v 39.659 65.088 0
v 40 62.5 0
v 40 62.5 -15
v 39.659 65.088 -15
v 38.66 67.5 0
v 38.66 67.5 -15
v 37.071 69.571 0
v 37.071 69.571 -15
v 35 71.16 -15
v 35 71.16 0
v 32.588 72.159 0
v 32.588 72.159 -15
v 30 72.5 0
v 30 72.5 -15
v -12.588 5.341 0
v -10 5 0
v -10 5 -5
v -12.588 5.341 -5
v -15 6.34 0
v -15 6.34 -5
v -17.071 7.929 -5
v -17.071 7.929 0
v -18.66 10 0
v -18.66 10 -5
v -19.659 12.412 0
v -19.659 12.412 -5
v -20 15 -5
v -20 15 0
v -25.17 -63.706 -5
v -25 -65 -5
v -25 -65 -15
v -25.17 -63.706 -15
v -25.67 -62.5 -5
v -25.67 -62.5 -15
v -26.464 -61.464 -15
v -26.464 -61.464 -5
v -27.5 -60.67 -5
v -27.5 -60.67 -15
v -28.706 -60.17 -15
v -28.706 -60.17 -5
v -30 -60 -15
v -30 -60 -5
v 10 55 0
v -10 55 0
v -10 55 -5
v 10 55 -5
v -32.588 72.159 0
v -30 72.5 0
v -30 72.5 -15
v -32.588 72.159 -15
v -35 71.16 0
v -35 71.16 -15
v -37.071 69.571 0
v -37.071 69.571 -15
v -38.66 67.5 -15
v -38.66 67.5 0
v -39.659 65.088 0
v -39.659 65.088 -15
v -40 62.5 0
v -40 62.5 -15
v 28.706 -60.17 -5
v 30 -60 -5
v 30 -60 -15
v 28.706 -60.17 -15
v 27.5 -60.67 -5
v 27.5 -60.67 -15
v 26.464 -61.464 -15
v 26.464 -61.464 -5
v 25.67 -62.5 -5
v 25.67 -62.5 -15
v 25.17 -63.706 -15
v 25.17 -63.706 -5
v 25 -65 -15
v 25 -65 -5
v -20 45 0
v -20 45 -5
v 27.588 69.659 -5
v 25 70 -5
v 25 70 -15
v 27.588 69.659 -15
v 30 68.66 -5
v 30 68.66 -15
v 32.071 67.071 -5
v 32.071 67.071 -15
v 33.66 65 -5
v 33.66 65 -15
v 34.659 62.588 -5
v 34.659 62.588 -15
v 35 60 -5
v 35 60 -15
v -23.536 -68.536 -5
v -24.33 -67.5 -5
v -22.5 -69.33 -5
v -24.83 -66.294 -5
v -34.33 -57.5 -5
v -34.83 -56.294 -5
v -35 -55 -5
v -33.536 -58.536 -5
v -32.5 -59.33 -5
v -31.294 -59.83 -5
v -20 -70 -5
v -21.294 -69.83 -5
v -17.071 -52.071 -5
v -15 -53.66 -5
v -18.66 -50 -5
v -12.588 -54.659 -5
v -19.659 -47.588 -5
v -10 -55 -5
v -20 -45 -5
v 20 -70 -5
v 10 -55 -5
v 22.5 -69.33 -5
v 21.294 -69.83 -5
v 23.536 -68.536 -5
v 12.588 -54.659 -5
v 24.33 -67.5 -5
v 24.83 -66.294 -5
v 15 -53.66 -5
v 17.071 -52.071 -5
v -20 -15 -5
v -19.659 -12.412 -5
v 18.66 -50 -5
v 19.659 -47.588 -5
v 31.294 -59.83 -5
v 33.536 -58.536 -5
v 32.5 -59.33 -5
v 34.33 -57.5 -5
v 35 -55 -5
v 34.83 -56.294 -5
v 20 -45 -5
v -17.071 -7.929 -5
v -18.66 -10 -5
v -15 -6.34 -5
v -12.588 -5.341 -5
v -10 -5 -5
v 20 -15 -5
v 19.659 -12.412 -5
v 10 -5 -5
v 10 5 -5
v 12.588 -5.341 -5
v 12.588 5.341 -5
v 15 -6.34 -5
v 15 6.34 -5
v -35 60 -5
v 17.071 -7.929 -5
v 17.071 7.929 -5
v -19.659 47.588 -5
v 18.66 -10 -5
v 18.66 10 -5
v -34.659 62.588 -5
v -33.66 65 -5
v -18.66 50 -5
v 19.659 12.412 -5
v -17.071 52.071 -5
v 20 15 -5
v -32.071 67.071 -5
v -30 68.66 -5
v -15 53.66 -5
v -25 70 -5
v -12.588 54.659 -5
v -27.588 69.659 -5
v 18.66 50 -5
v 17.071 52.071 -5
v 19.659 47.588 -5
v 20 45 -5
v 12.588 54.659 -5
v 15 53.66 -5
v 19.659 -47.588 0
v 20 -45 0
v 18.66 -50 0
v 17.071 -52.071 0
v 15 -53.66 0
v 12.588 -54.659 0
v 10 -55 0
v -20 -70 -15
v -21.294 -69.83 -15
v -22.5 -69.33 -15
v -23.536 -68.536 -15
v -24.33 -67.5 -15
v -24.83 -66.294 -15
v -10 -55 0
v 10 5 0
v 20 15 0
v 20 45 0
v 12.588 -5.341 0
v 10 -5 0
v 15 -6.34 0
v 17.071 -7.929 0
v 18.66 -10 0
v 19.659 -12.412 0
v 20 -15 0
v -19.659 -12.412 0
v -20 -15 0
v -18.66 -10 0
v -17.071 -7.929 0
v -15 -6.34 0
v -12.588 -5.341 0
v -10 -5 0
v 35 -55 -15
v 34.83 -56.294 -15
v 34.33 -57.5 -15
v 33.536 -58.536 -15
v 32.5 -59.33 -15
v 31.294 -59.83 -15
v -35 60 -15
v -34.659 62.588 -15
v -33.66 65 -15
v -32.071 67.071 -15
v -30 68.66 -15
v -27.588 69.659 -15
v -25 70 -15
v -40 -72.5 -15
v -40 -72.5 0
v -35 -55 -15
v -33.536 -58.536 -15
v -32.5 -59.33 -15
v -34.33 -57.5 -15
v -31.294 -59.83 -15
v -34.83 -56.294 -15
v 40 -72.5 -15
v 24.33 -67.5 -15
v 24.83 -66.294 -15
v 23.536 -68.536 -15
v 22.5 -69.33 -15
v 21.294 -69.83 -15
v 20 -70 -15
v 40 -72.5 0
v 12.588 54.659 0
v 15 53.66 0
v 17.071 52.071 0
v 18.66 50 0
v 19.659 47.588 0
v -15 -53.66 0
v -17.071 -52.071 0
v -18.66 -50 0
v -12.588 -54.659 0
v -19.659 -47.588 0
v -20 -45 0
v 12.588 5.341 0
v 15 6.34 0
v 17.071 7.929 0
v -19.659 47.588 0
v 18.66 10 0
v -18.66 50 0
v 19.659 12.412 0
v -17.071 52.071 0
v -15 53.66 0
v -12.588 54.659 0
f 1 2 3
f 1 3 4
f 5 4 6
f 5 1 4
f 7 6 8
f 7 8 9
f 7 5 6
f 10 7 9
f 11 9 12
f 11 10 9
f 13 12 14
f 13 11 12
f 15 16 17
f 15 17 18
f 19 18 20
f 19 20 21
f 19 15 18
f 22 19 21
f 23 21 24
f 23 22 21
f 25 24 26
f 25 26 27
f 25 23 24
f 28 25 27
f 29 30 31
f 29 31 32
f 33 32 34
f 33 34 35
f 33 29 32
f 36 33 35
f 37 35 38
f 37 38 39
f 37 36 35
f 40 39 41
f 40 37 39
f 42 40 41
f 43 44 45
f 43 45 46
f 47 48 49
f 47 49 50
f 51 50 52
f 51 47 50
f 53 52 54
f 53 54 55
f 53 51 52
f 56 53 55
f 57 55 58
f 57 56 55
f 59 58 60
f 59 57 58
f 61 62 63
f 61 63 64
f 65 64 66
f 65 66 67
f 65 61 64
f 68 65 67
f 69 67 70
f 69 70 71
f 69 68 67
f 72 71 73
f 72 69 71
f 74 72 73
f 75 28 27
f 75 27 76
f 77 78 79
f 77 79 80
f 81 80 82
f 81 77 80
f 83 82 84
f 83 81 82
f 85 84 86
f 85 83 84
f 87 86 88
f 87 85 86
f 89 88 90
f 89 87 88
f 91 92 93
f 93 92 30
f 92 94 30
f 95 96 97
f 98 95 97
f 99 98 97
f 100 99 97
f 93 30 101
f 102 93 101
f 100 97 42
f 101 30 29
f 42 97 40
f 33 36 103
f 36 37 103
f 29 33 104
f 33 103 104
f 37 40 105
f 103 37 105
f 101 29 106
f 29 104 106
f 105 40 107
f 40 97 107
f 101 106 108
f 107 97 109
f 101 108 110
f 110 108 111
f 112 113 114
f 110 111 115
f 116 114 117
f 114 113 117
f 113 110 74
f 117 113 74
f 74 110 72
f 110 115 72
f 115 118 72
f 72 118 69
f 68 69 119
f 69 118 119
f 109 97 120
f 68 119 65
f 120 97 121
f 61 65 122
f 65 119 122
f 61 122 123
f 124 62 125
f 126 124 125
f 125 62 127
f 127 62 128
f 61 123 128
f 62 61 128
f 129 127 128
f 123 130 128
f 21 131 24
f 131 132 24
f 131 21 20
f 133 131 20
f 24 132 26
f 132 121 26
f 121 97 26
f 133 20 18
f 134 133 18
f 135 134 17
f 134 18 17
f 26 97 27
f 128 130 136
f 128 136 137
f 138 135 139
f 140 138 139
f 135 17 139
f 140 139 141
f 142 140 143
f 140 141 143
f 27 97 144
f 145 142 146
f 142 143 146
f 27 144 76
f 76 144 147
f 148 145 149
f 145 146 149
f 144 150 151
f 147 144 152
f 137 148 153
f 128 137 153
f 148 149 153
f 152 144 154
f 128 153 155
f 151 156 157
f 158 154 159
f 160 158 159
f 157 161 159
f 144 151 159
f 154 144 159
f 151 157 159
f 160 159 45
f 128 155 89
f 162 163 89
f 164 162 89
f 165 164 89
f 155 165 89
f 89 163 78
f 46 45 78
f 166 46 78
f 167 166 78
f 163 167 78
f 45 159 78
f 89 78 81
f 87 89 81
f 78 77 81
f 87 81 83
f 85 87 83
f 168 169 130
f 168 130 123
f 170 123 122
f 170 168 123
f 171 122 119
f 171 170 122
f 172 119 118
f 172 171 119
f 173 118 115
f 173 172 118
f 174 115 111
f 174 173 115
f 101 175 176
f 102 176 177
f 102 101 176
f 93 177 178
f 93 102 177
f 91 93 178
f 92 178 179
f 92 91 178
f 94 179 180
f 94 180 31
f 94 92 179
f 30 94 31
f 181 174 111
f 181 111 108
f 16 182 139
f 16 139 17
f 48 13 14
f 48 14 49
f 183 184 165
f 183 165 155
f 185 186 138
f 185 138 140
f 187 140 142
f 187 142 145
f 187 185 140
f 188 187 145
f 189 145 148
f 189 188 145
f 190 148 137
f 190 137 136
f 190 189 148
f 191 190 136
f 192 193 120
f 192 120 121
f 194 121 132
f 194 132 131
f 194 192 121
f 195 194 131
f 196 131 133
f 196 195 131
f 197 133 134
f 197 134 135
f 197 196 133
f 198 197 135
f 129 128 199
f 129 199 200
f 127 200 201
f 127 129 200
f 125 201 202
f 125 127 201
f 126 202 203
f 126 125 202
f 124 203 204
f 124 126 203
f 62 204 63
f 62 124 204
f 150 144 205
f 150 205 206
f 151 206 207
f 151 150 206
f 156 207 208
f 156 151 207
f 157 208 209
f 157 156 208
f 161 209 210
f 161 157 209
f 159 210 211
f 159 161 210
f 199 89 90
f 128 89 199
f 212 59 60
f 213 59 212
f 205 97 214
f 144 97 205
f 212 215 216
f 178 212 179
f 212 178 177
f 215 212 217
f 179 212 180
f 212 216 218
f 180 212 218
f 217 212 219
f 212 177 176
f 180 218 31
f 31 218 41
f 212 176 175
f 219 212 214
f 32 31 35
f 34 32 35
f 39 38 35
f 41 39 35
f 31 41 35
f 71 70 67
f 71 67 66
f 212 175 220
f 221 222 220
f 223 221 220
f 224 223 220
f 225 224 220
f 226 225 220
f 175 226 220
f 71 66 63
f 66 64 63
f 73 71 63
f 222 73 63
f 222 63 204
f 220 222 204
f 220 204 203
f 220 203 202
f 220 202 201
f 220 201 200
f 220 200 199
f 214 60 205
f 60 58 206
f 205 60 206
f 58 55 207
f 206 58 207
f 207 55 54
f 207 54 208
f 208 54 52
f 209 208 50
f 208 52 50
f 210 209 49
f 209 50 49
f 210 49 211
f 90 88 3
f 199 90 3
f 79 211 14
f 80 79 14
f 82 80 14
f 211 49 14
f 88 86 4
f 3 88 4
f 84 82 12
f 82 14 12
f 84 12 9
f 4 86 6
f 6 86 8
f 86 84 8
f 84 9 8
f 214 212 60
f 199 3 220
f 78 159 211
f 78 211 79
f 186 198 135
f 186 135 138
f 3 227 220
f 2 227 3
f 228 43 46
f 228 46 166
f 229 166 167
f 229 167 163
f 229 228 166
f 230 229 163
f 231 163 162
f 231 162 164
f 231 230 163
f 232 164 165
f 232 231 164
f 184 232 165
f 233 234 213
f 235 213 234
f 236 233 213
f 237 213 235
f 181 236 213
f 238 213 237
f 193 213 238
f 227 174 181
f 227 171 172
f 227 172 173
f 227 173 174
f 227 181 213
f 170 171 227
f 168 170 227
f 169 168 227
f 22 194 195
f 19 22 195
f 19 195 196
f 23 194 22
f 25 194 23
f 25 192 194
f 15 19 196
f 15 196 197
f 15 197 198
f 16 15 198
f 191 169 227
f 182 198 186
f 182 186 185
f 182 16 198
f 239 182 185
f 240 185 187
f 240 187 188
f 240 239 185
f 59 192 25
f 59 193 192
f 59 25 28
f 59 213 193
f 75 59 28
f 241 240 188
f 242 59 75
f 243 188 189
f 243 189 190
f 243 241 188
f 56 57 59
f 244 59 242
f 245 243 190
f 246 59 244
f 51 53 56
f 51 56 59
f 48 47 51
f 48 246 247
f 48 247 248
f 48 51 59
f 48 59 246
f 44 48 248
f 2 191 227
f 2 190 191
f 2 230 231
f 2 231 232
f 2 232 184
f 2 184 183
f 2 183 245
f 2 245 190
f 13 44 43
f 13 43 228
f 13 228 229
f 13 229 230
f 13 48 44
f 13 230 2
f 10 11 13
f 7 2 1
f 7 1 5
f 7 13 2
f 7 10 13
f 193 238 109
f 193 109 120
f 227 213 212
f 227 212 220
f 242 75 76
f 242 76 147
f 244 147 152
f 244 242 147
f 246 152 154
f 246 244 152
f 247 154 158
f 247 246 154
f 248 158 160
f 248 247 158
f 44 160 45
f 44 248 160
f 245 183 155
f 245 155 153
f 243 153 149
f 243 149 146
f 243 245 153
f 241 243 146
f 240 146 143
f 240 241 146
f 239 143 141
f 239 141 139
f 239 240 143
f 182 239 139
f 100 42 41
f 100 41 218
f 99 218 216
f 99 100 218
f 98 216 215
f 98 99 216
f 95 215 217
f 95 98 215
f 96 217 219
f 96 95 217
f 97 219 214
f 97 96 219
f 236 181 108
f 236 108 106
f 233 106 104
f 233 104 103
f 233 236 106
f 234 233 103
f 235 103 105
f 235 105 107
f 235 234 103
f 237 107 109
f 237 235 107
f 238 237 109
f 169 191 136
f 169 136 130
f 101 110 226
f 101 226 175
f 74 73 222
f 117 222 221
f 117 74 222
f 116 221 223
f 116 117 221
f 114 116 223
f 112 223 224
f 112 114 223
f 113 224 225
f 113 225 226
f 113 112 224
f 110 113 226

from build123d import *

# Parameters (mm, degrees)
F1_DEPTH = 5
F2_DEPTH = 15


with BuildPart() as f1:
    # F0 (on Top) → F1 (new body)
    with BuildSketch(Plane.XY):
        with BuildLine():
            ThreePointArc((40, 62.5), (37.071068, 69.571068), (30, 72.5))
            Line((30, 72.5), (-30, 72.5))
            ThreePointArc((-30, 72.5), (-37.071068, 69.571068), (-40, 62.5))
            Line((-40, 62.5), (-40, -72.5))
            Line((-40, -72.5), (40, -72.5))
            Line((40, -72.5), (40, 62.5))
        make_face()
        with BuildLine():
            Line((-25, 70), (25, 70))
            ThreePointArc((25, 70), (32.071068, 67.071068), (35, 60))
            Line((35, 60), (35, -55))
            ThreePointArc((35, -55), (33.535534, -58.535534), (30, -60))
            ThreePointArc((30, -60), (26.464466, -61.464466), (25, -65))
            ThreePointArc((25, -65), (23.535534, -68.535534), (20, -70))
            Line((20, -70), (-20, -70))
            ThreePointArc((-20, -70), (-23.535534, -68.535534), (-25, -65))
            ThreePointArc((-25, -65), (-26.464466, -61.464466), (-30, -60))
            ThreePointArc((-30, -60), (-33.535534, -58.535534), (-35, -55))
            Line((-35, -55), (-35, 60))
            ThreePointArc((-35, 60), (-32.071068, 67.071068), (-25, 70))
        make_face(mode=Mode.SUBTRACT)
        with BuildLine():
            ThreePointArc((35, 60), (32.071068, 67.071068), (25, 70))
            Line((25, 70), (-25, 70))
            ThreePointArc((-25, 70), (-32.071068, 67.071068), (-35, 60))
            Line((-35, 60), (-35, -55))
            ThreePointArc((-35, -55), (-33.535534, -58.535534), (-30, -60))
            ThreePointArc((-30, -60), (-26.464466, -61.464466), (-25, -65))
            ThreePointArc((-25, -65), (-23.535534, -68.535534), (-20, -70))
            Line((-20, -70), (20, -70))
            ThreePointArc((20, -70), (23.535534, -68.535534), (25, -65))
            ThreePointArc((25, -65), (26.464466, -61.464466), (30, -60))
            ThreePointArc((30, -60), (33.535534, -58.535534), (35, -55))
            Line((35, -55), (35, 60))
        make_face()
        with BuildLine():
            ThreePointArc((20, -45), (17.071068, -52.071068), (10, -55))
            Line((10, -55), (-10, -55))
            ThreePointArc((-10, -55), (-17.071068, -52.071068), (-20, -45))
            Line((-20, -45), (-20, -15))
            ThreePointArc((-20, -15), (-17.071068, -7.928932), (-10, -5))
            Line((-10, -5), (10, -5))
            ThreePointArc((10, -5), (17.071068, -7.928932), (20, -15))
            Line((20, -15), (20, -45))
        make_face(mode=Mode.SUBTRACT)
        with BuildLine():
            Line((-10, 55), (10, 55))
            ThreePointArc((10, 55), (17.071068, 52.071068), (20, 45))
            Line((20, 45), (20, 15))
            ThreePointArc((20, 15), (17.071068, 7.928932), (10, 5))
            Line((10, 5), (-10, 5))
            ThreePointArc((-10, 5), (-17.071068, 7.928932), (-20, 15))
            Line((-20, 15), (-20, 45))
            ThreePointArc((-20, 45), (-17.071068, 52.071068), (-10, 55))
        make_face(mode=Mode.SUBTRACT)
    extrude(amount=-F1_DEPTH)

    # F0 (on Top) → F2 (join)
    with BuildSketch(Plane.XY):
        with BuildLine():
            ThreePointArc((40, 62.5), (37.071068, 69.571068), (30, 72.5))
            Line((30, 72.5), (-30, 72.5))
            ThreePointArc((-30, 72.5), (-37.071068, 69.571068), (-40, 62.5))
            Line((-40, 62.5), (-40, -72.5))
            Line((-40, -72.5), (40, -72.5))
            Line((40, -72.5), (40, 62.5))
        make_face()
        with BuildLine():
            Line((-25, 70), (25, 70))
            ThreePointArc((25, 70), (32.071068, 67.071068), (35, 60))
            Line((35, 60), (35, -55))
            ThreePointArc((35, -55), (33.535534, -58.535534), (30, -60))
            ThreePointArc((30, -60), (26.464466, -61.464466), (25, -65))
            ThreePointArc((25, -65), (23.535534, -68.535534), (20, -70))
            Line((20, -70), (-20, -70))
            ThreePointArc((-20, -70), (-23.535534, -68.535534), (-25, -65))
            ThreePointArc((-25, -65), (-26.464466, -61.464466), (-30, -60))
            ThreePointArc((-30, -60), (-33.535534, -58.535534), (-35, -55))
            Line((-35, -55), (-35, 60))
            ThreePointArc((-35, 60), (-32.071068, 67.071068), (-25, 70))
        make_face(mode=Mode.SUBTRACT)
    extrude(amount=-F2_DEPTH)


solid = f1.part
